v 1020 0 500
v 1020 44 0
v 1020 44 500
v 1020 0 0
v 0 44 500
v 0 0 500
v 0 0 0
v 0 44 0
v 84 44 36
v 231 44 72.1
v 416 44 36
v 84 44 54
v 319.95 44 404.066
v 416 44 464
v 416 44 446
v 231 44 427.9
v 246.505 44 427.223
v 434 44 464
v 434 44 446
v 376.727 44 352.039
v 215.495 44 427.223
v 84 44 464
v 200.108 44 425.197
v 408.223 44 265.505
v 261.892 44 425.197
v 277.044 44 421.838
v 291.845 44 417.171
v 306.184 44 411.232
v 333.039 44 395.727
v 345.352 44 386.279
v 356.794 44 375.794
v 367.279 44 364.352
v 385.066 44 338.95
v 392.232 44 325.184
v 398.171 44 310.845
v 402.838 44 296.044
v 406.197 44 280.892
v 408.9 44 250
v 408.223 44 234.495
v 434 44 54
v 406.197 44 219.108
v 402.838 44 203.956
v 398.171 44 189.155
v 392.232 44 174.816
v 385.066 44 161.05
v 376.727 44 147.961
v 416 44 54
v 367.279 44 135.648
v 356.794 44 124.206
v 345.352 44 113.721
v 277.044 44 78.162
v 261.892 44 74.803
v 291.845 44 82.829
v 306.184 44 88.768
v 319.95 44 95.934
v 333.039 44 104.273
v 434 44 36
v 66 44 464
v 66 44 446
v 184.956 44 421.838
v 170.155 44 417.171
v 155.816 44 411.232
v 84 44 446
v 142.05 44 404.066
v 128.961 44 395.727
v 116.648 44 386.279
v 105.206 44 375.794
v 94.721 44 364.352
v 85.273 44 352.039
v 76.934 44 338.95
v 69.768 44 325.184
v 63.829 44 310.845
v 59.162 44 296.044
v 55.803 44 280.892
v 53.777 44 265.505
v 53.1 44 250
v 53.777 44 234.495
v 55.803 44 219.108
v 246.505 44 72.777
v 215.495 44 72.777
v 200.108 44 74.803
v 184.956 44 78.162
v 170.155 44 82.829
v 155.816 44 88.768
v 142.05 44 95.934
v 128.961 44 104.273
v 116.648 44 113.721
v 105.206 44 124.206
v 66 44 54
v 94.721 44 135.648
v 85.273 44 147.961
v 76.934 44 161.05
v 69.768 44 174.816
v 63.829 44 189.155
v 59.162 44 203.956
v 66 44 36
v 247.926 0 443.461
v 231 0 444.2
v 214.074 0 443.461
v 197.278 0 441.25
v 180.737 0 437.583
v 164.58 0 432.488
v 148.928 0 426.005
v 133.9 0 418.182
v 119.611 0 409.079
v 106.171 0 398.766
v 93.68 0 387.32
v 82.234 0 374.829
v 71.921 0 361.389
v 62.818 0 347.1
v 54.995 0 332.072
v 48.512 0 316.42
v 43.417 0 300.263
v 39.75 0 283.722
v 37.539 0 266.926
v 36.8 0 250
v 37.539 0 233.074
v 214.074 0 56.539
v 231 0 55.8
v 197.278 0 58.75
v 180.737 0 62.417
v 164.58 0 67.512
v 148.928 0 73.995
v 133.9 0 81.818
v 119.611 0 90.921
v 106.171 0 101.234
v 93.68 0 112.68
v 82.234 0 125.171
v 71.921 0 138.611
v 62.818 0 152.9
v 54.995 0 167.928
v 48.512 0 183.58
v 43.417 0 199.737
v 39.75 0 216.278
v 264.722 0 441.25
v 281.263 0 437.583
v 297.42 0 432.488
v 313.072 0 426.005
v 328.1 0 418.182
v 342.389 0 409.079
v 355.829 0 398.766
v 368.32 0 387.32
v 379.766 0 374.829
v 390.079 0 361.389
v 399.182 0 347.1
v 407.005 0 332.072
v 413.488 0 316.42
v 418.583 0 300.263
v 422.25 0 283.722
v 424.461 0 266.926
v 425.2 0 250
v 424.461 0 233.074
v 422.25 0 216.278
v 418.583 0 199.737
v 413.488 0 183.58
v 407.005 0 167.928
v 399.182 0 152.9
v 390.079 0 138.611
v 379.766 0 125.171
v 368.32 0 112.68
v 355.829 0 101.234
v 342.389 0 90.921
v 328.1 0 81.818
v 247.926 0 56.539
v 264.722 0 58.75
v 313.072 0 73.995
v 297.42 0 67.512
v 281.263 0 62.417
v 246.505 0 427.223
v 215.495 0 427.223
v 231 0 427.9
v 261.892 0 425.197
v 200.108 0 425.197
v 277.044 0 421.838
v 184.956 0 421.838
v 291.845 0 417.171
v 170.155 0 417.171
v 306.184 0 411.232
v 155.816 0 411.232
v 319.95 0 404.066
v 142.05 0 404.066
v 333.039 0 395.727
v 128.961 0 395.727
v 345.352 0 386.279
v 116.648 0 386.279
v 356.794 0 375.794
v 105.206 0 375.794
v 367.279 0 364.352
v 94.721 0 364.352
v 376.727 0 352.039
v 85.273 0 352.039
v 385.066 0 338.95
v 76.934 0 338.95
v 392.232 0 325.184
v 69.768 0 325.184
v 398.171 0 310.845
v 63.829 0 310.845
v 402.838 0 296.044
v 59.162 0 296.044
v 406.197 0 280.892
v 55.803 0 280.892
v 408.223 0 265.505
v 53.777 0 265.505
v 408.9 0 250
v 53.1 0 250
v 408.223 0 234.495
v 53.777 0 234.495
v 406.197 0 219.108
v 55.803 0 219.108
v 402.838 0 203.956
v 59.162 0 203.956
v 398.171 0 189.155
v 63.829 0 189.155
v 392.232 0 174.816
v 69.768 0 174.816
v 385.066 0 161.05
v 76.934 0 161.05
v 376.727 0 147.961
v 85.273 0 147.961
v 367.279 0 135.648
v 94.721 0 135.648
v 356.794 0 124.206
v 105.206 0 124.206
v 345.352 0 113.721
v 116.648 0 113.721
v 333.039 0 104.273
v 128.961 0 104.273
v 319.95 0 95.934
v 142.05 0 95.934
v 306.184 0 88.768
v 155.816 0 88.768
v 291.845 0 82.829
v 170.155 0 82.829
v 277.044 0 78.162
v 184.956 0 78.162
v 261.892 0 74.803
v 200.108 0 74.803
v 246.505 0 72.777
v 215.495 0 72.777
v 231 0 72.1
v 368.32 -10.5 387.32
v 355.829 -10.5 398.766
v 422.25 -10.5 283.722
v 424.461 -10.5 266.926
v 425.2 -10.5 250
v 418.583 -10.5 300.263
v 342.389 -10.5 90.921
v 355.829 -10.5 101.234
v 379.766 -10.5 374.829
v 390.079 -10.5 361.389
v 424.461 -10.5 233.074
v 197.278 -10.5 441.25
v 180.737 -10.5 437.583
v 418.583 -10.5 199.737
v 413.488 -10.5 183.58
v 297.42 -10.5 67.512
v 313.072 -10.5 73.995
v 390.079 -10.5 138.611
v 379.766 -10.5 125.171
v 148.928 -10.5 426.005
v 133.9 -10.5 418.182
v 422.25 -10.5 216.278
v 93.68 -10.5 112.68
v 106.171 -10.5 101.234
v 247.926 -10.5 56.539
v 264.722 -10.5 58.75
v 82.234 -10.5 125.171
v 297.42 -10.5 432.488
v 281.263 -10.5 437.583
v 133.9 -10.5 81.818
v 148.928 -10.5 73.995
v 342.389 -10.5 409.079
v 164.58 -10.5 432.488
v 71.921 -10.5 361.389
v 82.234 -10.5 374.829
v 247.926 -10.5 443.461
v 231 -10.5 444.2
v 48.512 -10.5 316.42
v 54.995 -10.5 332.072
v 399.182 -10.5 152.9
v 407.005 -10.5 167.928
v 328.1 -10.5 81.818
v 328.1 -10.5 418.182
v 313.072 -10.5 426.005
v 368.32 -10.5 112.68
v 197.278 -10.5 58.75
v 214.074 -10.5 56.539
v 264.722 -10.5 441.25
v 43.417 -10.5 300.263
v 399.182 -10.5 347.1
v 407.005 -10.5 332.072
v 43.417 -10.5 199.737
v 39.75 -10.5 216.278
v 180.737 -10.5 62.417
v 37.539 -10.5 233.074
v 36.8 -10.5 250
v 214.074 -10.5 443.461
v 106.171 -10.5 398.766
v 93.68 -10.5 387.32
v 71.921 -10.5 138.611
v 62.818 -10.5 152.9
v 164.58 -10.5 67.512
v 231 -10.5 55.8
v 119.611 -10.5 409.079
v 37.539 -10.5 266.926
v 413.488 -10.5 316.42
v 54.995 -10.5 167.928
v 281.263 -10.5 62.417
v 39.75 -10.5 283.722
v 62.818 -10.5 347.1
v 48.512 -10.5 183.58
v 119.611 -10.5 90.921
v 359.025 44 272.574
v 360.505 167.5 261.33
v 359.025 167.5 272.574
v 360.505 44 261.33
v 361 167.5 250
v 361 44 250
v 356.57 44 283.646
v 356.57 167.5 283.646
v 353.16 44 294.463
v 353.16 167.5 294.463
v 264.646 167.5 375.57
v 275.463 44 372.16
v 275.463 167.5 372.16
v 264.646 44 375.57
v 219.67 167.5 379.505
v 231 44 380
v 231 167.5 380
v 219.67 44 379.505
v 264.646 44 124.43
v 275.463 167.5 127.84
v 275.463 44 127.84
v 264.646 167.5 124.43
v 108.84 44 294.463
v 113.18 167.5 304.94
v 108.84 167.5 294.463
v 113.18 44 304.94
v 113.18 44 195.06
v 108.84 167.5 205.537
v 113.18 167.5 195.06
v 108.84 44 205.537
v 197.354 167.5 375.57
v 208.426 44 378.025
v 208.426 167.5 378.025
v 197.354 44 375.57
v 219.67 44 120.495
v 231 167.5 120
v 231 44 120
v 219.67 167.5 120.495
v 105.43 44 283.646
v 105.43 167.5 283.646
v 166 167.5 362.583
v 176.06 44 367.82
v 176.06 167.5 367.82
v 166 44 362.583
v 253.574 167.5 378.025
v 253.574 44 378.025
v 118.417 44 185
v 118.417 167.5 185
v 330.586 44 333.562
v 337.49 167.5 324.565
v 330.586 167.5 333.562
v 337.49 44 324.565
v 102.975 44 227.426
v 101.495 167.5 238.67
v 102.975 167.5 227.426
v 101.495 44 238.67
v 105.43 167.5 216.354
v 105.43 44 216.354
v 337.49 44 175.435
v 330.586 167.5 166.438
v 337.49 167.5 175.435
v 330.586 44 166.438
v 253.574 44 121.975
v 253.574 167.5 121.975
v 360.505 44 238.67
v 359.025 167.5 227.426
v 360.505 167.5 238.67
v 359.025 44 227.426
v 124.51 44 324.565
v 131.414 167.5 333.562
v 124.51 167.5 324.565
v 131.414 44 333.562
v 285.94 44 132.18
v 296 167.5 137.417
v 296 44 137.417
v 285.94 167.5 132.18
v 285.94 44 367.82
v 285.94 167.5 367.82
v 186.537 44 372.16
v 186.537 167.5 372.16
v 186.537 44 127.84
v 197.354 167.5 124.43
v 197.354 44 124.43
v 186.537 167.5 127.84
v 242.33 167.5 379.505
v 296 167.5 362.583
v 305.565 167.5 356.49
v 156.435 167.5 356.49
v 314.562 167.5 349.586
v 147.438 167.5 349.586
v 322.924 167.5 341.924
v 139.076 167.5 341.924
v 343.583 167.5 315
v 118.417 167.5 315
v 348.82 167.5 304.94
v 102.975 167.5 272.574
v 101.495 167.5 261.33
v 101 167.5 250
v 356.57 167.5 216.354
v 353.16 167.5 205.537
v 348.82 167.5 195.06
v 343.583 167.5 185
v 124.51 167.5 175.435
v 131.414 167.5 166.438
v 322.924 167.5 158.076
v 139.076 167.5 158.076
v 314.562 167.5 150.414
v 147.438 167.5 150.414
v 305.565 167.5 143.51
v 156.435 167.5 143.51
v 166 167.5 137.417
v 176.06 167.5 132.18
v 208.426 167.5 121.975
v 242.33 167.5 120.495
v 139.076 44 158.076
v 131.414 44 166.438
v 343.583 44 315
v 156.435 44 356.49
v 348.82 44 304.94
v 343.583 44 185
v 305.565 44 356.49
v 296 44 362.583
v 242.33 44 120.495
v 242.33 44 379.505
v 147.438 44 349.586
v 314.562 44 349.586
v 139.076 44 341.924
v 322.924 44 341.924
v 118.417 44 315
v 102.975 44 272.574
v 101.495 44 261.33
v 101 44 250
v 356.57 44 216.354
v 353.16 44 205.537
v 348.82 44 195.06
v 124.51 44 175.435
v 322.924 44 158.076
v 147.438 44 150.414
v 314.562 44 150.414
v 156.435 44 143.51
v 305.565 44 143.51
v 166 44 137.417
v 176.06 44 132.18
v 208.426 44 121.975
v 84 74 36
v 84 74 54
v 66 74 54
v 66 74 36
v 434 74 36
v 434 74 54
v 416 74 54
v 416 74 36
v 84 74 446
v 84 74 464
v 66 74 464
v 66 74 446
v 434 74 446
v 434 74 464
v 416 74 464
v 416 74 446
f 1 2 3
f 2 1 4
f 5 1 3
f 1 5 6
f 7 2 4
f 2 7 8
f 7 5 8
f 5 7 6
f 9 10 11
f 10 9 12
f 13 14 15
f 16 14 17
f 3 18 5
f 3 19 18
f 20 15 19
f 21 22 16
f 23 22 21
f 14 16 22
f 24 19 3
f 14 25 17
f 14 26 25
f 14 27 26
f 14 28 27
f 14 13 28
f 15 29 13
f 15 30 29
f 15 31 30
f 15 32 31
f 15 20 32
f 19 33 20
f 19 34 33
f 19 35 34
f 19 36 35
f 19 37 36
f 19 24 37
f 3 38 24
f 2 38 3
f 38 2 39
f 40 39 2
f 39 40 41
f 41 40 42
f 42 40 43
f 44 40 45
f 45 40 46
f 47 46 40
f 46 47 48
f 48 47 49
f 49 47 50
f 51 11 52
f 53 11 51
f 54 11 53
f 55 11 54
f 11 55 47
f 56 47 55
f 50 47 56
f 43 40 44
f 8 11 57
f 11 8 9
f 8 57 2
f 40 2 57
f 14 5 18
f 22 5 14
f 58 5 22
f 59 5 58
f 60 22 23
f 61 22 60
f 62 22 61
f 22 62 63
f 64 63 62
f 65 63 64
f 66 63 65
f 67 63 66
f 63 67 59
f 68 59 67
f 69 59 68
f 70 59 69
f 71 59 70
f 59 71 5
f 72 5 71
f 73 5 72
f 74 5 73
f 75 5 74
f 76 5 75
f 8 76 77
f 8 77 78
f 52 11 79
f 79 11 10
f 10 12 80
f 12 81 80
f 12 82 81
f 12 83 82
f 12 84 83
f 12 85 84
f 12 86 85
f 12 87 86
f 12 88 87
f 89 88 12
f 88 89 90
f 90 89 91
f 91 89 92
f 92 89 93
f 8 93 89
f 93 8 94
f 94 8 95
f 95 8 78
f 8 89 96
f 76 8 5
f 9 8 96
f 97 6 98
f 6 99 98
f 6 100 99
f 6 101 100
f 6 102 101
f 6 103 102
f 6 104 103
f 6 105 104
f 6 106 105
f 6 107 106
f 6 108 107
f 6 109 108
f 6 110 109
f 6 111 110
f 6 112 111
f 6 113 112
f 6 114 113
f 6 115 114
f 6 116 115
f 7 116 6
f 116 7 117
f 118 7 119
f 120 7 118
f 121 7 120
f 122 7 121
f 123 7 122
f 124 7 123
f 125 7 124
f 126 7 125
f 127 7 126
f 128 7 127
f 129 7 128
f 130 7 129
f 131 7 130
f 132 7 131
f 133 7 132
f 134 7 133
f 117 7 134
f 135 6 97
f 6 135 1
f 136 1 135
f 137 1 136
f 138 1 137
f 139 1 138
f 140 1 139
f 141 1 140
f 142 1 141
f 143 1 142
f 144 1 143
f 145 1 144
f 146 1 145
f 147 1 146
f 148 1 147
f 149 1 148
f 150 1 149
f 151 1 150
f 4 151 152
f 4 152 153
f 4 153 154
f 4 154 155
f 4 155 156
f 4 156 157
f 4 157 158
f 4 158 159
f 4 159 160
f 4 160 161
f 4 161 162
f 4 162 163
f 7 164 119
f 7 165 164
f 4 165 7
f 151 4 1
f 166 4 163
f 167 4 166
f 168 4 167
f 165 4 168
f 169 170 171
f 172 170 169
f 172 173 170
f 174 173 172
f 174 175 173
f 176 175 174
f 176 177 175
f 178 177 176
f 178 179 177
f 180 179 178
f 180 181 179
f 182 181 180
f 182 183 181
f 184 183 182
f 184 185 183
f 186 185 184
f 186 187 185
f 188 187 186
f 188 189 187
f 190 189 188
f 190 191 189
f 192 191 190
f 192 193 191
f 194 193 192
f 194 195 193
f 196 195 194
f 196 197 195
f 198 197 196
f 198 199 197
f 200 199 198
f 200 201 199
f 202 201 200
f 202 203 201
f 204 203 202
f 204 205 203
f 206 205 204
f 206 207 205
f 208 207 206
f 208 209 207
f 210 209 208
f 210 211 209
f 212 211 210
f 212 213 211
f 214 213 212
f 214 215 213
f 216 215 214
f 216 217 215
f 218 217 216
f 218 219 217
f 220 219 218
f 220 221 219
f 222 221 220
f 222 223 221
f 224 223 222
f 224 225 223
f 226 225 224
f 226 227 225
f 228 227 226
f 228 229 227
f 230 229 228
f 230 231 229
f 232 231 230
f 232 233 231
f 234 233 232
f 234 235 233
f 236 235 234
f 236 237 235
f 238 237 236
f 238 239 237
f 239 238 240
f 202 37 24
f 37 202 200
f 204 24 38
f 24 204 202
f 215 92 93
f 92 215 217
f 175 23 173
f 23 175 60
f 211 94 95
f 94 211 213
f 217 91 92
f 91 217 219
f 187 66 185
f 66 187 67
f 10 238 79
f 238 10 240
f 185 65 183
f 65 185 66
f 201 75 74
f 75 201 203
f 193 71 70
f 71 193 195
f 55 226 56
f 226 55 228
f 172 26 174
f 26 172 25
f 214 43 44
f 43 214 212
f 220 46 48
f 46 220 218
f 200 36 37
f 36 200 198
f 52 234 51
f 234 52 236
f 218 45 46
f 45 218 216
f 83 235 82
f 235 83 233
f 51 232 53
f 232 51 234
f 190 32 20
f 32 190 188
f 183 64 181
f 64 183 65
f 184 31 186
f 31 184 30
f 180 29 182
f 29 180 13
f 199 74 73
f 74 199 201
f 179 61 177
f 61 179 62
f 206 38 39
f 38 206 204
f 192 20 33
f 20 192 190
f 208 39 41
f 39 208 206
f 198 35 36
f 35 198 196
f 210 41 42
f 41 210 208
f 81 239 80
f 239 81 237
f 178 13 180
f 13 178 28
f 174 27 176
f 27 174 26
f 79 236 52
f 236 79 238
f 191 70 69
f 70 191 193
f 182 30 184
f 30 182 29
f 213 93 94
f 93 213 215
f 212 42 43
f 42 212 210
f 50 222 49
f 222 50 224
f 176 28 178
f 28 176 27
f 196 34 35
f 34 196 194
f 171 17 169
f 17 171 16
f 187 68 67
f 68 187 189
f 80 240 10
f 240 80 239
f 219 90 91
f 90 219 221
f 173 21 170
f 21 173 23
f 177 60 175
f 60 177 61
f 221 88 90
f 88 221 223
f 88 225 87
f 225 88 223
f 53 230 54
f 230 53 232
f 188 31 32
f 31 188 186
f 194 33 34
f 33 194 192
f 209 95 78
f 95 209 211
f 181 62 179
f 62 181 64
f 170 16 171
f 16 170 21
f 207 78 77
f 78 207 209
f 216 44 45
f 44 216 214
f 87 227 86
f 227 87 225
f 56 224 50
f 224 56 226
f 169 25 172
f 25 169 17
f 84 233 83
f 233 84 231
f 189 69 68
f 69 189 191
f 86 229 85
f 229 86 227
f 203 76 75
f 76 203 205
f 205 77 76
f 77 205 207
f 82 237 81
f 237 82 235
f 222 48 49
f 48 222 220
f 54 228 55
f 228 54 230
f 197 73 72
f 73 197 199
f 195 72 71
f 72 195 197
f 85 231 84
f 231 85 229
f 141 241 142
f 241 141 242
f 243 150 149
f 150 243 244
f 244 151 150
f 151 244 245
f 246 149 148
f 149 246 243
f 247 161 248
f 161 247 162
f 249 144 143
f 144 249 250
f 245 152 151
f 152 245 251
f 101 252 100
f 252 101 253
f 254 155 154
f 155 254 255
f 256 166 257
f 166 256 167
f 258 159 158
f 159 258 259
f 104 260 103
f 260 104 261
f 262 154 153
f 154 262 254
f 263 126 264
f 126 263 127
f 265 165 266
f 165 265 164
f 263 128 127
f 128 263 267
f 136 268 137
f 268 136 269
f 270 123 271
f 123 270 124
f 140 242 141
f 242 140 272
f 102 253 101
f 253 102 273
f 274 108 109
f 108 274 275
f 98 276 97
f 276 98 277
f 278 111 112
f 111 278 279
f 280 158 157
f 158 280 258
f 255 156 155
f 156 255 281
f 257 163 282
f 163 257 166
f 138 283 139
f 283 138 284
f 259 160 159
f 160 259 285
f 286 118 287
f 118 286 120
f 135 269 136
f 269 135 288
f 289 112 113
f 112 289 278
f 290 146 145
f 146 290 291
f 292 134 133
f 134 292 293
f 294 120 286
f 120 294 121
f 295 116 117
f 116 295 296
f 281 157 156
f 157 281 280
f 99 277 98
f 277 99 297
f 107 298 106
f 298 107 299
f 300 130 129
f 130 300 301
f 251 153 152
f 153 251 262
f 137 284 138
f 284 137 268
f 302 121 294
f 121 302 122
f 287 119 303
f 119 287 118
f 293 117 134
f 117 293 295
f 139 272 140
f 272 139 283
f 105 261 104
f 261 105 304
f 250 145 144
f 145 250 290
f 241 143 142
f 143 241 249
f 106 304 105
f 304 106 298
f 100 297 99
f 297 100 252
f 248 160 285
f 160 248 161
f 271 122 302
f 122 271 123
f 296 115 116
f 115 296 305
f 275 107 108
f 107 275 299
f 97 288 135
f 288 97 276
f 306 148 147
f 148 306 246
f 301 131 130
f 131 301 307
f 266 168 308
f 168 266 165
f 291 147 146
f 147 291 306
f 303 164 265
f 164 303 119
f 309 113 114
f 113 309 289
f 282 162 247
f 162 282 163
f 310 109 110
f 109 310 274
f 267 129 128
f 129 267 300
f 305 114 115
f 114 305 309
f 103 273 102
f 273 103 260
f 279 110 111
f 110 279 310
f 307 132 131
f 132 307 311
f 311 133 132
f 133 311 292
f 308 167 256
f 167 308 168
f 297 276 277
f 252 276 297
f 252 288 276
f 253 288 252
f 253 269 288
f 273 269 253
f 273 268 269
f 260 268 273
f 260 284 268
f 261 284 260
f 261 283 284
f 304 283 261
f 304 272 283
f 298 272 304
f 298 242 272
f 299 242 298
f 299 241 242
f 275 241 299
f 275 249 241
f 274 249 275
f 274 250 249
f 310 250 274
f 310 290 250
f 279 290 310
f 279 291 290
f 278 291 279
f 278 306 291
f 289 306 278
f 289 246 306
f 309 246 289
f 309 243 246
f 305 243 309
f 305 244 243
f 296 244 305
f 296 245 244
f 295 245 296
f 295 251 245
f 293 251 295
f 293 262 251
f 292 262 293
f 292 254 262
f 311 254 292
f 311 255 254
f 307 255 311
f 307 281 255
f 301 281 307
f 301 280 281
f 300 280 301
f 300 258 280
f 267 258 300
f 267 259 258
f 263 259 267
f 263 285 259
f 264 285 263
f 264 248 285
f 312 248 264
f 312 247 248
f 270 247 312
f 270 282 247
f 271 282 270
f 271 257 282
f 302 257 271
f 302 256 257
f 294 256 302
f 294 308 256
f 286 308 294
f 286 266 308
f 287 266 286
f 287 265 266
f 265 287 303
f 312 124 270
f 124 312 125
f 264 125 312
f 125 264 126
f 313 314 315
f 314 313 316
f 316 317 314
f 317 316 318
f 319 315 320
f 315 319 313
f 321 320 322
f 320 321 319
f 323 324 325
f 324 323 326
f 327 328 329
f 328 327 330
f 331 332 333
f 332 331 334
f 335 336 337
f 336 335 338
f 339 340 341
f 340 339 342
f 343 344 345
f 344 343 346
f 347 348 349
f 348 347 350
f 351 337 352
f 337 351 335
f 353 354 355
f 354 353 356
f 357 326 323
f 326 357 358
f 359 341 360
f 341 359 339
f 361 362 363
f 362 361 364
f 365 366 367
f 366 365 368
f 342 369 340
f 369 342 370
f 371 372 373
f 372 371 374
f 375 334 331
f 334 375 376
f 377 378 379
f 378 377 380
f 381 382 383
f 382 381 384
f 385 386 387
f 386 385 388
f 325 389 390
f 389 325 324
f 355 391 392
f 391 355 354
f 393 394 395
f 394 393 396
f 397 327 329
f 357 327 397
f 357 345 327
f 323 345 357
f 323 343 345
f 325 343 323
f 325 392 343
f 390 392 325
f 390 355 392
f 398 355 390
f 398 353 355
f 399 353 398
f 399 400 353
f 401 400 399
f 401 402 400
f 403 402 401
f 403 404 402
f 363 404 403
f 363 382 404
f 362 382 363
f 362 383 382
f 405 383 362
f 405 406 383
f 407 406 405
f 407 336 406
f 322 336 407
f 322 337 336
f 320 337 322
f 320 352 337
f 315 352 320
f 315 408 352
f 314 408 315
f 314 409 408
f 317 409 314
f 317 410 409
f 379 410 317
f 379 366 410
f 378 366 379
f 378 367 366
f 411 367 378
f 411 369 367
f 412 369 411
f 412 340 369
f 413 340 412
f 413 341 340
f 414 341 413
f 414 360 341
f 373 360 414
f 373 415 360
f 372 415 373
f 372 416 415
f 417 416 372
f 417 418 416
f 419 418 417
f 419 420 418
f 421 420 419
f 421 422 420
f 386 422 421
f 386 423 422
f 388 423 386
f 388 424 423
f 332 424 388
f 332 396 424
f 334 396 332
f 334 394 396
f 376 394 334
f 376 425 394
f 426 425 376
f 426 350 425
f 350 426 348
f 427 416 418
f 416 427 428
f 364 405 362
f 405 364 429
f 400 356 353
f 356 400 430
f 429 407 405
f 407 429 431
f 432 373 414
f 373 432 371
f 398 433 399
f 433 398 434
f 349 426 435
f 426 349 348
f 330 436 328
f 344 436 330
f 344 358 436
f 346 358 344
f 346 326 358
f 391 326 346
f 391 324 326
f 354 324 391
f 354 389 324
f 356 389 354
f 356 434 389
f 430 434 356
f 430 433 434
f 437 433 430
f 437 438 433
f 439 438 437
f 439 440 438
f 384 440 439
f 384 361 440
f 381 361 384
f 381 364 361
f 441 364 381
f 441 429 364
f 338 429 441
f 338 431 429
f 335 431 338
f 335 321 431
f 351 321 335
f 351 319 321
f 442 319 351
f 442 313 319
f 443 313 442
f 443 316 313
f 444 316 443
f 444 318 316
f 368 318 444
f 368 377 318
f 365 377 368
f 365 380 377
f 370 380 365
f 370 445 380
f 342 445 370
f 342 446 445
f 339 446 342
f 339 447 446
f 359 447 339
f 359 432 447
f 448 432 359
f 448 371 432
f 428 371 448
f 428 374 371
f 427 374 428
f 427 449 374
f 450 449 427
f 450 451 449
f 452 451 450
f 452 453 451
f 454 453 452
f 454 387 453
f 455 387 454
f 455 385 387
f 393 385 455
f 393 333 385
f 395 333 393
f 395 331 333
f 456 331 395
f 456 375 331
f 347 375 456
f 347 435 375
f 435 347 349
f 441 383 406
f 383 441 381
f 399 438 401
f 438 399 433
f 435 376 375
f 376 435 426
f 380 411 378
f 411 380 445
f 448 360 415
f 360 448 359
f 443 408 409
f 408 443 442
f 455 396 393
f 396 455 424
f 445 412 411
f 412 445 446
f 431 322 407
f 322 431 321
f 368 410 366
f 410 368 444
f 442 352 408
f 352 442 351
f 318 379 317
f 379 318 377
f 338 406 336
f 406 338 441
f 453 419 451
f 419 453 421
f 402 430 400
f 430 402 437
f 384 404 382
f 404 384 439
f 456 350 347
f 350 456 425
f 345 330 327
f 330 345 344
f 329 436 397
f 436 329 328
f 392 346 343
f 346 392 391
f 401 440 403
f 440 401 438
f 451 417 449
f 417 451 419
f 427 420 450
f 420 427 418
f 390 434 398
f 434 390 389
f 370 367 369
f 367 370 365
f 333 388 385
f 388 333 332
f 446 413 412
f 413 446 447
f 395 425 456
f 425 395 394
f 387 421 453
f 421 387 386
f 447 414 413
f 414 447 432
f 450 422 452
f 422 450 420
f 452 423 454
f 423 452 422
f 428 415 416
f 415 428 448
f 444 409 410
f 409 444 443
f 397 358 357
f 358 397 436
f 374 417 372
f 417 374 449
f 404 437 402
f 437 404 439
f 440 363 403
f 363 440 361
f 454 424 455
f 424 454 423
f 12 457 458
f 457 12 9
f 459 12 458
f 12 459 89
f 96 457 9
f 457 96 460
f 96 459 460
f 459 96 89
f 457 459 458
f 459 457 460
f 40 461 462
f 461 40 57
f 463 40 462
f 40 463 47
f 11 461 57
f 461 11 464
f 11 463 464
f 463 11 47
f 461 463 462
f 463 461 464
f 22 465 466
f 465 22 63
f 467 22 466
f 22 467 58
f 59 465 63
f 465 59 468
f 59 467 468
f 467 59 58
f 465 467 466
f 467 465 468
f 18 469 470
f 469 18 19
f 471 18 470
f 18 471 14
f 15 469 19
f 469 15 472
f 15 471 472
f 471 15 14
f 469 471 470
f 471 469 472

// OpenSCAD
// P41D - EXPLORATORY 3D paths; geometry only, NOT CNC or checked load paths.
// OpenSCAD, units mm. Change variant to "rails4" to compare.
// Driver basket/magnet and bolted connections are SURROGATES.
$fn=72;
variant="carrier4"; // carrier4 or rails4
show_panel=true;
show_driver_envelope=true;
show_supports=true;
show_straight_links=false; // WARNING: some straight 2D links cross cutout (P41C).
baffle_W=1020;baffle_D=425;baffle_H=500;front_t=44;wall_t=22;
driver_x=231;driver_z=250;cutout_d=355.8;frame_d=388.4;bolt_r=184;
carrier_points=[[75,45],[425,45],[75,455],[425,455]];
rails_points=[[176,37],[286,37],[176,463],[286,463]];
points=variant=="carrier4"?carrier_points:rails_points;
half_width=9;
assert(variant=="carrier4"||variant=="rails4","Unknown variant");
assert(driver_x-frame_d/2>wall_t,"Driver flanged edge crosses left inner wall");
assert(driver_z-frame_d/2>wall_t,"Driver flanged edge crosses lower inner wall");
module ycylinder(d,h,x,y,z){
 translate([x,y,z])rotate([90,0,0])cylinder(d=d,h=h,center=true);
}
module panel(){
 color([0.80,0.65,0.48,.75])difference(){
  cube([baffle_W,front_t,baffle_H]);
  ycylinder(cutout_d,front_t+2,driver_x,front_t/2,driver_z);
 }
}
module basket_envelope(){
 color([.22,.36,.52,.50])ycylinder(frame_d,10.5,driver_x,-5.25,driver_z);
 color([.35,.55,.65,.16])ycylinder(260,123.5,driver_x,front_t+123.5/2,driver_z);
}
module pad(q){
 color([.26,.58,.65,.85])translate([q[0]-half_width,front_t,q[1]-half_width])
 cube([2*half_width,30,2*half_width]);
}
module rail(q){
 color([.35,.58,.60,.65])translate([q[0]-half_width,front_t,q[1]-half_width])
 cube([2*half_width,baffle_D-front_t-wall_t,2*half_width]);
}
module link_segment(a,b){
 // Unqualified straight carrier link: may project into cutout/motor.
 color([.87,.43,.32,.70])hull(){
  ycylinder(8,7,a[0],front_t+8,a[1]);
  ycylinder(8,7,b[0],front_t+8,b[1]);
 }
}
function dist2(a,b)=(a[0]-b[0])*(a[0]-b[0])+(a[1]-b[1])*(a[1]-b[1]);
function nearest_pad_idx(b)=let(v=[for(i=[0:len(points)-1])dist2(points[i],b)])
 search(min(v),v)[0];
if(show_panel)panel();
if(show_driver_envelope)basket_envelope();
if(show_supports)for(p=points) {
 if(variant=="carrier4")pad(p);
 else rail(p);
}
if(show_straight_links)for(i=[0:7]){
 bolt=[driver_x+bolt_r*cos(45*i),driver_z+bolt_r*sin(45*i)];
 link_segment(bolt,points[nearest_pad_idx(bolt)]);
}
echo("P41 supports:",variant,"points:",len(points));
echo("All support-to-driver links and wall joints are NOT qualified. Do not use for CNC.");
